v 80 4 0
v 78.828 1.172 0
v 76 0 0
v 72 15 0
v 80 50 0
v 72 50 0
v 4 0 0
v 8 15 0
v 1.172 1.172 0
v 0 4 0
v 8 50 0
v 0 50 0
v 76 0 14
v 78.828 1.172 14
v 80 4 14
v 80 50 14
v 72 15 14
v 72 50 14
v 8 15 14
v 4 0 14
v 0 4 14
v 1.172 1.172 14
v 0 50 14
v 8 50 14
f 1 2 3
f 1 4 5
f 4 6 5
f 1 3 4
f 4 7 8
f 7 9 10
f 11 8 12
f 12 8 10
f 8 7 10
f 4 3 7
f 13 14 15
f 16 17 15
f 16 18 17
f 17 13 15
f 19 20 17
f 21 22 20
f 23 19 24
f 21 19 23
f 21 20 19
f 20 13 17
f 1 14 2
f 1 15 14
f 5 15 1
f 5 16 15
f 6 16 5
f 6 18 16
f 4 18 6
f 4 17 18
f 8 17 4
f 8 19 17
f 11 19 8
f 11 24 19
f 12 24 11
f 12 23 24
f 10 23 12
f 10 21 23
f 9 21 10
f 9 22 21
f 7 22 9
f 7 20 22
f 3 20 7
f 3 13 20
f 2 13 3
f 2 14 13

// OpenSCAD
$fn = 32;

// ----------------------------------------------------------------------
// Heat sink frame: 80 x 50 mm frame, 8 mm walls
// ----------------------------------------------------------------------

// --- parameters (mm) ---
profile_height = 14;      // extrusion height
profile_points = 12;      // points of the closed outline

profile = [[0, 4], [1.172, 1.172], [4, 0], [76, 0], [78.828, 1.172], [80, 4], [80, 50], [72, 50], [72, 15], [8, 15], [8, 50], [0, 50]];  // single closed polygon, 12 points, counter clockwise

// --- the one profile operation ---
linear_extrude(height = profile_height) polygon(points = profile);
